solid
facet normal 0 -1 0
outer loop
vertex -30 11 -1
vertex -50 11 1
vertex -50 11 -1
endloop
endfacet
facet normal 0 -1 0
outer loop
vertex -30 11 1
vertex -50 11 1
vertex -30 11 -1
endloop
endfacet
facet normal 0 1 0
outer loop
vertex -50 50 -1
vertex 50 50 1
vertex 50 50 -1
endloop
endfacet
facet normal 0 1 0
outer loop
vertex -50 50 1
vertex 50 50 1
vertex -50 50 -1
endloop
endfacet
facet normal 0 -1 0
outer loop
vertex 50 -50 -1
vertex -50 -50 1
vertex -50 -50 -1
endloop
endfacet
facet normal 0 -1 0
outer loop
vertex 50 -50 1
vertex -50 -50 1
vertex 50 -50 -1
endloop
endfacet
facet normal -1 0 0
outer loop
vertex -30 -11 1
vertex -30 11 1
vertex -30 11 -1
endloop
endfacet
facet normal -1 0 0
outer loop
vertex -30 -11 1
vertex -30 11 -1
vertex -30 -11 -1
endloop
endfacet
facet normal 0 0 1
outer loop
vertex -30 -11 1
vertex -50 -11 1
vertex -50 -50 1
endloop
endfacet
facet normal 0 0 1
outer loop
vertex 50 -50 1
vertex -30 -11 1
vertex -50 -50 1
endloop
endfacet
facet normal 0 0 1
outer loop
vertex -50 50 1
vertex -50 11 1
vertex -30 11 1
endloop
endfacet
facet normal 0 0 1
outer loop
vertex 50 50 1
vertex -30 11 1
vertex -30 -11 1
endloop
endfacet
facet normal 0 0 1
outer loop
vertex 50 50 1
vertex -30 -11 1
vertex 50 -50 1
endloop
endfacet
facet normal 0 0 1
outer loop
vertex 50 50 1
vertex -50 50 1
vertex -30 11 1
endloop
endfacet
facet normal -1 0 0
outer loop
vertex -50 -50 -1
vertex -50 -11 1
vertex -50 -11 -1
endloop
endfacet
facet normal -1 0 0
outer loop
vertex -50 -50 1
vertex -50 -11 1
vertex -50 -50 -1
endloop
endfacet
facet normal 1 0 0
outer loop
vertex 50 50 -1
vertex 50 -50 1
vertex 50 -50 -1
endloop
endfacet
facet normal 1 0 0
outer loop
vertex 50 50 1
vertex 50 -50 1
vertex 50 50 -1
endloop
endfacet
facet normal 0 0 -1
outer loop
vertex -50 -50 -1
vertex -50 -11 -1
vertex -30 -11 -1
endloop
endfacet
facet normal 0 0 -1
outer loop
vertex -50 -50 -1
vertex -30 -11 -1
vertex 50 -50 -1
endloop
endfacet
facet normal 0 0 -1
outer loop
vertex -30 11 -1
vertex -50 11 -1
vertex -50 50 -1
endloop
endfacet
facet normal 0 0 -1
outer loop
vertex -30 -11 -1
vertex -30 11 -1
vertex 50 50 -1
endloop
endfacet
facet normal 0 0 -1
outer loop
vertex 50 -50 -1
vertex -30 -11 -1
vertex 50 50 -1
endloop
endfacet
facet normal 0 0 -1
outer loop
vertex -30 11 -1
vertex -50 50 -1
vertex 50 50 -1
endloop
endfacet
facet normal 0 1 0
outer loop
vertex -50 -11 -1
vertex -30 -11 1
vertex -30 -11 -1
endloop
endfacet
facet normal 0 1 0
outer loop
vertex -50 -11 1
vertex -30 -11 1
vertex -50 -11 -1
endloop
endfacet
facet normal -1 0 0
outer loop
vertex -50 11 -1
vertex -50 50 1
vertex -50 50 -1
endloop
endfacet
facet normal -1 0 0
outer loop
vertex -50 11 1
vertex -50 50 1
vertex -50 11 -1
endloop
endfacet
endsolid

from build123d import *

# Parameters (mm, degrees)
F1_DEPTH = 1


with BuildPart() as f1:
    # F0 (on Top) → F1 (new body, symmetric)
    with BuildSketch(Plane.XY):
        Polygon((-50, -50), (50, -50), (50, 50), (-50, 50), (-50, 11), (-30, 11), (-30, -11), (-50, -11), align=None)
    extrude(amount=F1_DEPTH, both=True)


solid = f1.part
